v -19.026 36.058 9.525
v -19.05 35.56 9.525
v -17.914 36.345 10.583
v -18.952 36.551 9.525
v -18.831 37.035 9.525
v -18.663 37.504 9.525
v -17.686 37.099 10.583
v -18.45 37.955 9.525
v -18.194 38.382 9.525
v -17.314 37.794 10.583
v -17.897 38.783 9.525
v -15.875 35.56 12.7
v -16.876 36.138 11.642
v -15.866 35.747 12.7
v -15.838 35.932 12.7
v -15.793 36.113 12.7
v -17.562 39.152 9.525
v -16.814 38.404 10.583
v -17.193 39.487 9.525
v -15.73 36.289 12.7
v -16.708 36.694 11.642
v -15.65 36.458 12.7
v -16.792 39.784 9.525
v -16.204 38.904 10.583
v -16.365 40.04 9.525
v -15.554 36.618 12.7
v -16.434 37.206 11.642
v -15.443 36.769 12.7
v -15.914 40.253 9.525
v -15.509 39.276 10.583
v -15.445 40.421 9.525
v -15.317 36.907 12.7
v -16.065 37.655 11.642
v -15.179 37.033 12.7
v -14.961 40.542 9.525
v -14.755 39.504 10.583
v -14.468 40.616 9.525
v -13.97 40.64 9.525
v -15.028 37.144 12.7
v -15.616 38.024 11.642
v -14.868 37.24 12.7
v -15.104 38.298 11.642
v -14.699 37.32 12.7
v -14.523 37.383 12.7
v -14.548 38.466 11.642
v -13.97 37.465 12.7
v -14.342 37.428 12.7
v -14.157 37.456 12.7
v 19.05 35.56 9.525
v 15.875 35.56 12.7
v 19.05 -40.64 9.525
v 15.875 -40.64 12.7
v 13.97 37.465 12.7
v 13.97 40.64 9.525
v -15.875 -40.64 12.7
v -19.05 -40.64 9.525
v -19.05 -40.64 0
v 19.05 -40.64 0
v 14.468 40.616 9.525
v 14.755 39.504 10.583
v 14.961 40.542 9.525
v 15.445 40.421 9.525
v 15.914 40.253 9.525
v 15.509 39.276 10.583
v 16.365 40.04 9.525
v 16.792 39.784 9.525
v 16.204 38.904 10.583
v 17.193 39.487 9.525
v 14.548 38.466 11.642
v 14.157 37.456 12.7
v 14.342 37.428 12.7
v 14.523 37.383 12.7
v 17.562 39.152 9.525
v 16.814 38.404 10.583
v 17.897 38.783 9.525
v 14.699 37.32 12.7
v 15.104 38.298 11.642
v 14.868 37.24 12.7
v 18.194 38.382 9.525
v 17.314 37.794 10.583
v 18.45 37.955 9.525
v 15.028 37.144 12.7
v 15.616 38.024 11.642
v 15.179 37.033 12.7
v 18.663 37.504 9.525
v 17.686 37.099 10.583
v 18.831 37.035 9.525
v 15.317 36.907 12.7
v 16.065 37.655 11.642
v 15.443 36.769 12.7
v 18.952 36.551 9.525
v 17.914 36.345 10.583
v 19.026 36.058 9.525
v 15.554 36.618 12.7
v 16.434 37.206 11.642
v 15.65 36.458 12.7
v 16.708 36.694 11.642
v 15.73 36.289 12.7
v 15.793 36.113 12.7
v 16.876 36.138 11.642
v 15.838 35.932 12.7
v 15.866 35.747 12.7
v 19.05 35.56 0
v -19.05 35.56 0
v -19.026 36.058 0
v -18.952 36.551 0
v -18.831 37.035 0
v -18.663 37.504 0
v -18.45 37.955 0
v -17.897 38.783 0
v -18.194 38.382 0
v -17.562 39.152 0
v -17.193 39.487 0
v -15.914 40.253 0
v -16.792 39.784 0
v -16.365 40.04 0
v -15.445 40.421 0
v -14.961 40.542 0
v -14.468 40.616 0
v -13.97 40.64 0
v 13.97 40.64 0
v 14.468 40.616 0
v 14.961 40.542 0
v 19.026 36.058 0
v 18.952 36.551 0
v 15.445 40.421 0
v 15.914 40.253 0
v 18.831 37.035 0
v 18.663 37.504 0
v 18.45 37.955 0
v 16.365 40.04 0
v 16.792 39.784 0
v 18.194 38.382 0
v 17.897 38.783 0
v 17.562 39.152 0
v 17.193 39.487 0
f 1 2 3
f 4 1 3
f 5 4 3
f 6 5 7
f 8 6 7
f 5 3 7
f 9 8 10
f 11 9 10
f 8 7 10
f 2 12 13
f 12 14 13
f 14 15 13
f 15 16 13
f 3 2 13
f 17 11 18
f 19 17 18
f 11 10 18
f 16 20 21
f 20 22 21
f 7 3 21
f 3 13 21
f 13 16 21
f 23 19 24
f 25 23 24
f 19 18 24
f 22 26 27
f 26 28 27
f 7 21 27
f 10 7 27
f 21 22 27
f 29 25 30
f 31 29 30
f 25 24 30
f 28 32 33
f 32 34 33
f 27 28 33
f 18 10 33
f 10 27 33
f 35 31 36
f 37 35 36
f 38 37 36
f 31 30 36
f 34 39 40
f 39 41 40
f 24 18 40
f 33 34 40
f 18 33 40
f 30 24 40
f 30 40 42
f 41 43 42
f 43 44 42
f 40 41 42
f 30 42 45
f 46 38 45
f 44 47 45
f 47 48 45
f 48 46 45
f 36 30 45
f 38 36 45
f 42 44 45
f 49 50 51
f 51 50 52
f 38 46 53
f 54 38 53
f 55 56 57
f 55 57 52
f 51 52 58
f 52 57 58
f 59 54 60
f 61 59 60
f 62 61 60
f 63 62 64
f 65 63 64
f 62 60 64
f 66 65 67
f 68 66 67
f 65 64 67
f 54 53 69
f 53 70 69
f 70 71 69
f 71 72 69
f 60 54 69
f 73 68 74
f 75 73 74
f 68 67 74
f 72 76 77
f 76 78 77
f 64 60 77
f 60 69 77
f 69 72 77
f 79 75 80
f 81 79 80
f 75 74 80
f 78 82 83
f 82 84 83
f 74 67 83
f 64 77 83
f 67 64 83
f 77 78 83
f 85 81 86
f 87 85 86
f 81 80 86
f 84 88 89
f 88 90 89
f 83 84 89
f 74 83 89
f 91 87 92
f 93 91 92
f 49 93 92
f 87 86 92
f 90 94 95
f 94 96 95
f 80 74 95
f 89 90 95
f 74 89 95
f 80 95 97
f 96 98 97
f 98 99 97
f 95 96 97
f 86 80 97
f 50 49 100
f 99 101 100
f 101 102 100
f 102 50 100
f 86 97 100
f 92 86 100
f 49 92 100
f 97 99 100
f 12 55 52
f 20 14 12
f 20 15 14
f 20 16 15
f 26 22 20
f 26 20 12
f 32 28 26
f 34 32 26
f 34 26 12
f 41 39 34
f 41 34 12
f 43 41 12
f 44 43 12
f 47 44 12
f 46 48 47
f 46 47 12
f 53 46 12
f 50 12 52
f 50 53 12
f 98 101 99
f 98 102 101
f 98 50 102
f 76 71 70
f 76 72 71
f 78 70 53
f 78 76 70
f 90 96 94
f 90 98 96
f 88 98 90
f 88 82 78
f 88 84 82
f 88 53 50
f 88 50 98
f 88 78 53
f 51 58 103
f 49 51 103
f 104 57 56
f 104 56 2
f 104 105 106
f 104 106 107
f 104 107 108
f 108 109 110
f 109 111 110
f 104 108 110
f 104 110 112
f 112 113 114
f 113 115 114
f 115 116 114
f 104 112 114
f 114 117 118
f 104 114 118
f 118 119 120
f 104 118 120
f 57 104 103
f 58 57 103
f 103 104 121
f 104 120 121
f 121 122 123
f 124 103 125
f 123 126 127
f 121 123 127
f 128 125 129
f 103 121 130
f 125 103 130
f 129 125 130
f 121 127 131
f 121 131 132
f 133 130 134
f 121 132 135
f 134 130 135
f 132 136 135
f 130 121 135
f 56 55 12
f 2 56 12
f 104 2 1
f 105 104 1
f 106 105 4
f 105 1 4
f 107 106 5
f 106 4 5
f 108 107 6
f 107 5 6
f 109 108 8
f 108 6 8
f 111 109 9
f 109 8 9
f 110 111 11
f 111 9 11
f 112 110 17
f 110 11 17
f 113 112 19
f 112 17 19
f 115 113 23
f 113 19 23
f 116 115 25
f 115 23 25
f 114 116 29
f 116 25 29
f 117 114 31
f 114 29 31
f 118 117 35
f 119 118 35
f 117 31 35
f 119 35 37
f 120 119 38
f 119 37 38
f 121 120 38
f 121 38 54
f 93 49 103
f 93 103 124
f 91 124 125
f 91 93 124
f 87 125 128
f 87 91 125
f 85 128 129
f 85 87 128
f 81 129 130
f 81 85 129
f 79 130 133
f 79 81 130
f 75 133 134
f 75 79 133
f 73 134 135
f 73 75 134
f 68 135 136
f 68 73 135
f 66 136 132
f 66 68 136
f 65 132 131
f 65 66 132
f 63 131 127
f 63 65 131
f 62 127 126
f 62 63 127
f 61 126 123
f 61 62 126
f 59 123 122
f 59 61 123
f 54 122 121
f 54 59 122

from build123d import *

# Parameters (mm, degrees)
F0_W     = 38.1
F0_H     = 81.28
F1_DEPTH = 12.7
F2_R     = 5.08
F3_SIZE  = 3.175


with BuildPart() as f1:
    # F0 (on Top) → F1 (new body)
    with BuildSketch(Plane.XY):
        Rectangle(F0_W, F0_H)
    extrude(amount=F1_DEPTH)

    # F2
    f2_edges = [f1.edges().sort_by_distance(p)[0] for p in [
        (-19.05, 40.64, 6.35),
        (19.05, 40.64, 6.35),
    ]]
    fillet(f2_edges, radius=F2_R)

    # F3
    f3_edges = [f1.edges().sort_by_distance(p)[0] for p in [
        (-19.05, -2.54, 12.7),
        (0, 40.64, 12.7),
        (19.05, -2.54, 12.7),
    ]]
    chamfer(f3_edges, length=F3_SIZE)


solid = f1.part
